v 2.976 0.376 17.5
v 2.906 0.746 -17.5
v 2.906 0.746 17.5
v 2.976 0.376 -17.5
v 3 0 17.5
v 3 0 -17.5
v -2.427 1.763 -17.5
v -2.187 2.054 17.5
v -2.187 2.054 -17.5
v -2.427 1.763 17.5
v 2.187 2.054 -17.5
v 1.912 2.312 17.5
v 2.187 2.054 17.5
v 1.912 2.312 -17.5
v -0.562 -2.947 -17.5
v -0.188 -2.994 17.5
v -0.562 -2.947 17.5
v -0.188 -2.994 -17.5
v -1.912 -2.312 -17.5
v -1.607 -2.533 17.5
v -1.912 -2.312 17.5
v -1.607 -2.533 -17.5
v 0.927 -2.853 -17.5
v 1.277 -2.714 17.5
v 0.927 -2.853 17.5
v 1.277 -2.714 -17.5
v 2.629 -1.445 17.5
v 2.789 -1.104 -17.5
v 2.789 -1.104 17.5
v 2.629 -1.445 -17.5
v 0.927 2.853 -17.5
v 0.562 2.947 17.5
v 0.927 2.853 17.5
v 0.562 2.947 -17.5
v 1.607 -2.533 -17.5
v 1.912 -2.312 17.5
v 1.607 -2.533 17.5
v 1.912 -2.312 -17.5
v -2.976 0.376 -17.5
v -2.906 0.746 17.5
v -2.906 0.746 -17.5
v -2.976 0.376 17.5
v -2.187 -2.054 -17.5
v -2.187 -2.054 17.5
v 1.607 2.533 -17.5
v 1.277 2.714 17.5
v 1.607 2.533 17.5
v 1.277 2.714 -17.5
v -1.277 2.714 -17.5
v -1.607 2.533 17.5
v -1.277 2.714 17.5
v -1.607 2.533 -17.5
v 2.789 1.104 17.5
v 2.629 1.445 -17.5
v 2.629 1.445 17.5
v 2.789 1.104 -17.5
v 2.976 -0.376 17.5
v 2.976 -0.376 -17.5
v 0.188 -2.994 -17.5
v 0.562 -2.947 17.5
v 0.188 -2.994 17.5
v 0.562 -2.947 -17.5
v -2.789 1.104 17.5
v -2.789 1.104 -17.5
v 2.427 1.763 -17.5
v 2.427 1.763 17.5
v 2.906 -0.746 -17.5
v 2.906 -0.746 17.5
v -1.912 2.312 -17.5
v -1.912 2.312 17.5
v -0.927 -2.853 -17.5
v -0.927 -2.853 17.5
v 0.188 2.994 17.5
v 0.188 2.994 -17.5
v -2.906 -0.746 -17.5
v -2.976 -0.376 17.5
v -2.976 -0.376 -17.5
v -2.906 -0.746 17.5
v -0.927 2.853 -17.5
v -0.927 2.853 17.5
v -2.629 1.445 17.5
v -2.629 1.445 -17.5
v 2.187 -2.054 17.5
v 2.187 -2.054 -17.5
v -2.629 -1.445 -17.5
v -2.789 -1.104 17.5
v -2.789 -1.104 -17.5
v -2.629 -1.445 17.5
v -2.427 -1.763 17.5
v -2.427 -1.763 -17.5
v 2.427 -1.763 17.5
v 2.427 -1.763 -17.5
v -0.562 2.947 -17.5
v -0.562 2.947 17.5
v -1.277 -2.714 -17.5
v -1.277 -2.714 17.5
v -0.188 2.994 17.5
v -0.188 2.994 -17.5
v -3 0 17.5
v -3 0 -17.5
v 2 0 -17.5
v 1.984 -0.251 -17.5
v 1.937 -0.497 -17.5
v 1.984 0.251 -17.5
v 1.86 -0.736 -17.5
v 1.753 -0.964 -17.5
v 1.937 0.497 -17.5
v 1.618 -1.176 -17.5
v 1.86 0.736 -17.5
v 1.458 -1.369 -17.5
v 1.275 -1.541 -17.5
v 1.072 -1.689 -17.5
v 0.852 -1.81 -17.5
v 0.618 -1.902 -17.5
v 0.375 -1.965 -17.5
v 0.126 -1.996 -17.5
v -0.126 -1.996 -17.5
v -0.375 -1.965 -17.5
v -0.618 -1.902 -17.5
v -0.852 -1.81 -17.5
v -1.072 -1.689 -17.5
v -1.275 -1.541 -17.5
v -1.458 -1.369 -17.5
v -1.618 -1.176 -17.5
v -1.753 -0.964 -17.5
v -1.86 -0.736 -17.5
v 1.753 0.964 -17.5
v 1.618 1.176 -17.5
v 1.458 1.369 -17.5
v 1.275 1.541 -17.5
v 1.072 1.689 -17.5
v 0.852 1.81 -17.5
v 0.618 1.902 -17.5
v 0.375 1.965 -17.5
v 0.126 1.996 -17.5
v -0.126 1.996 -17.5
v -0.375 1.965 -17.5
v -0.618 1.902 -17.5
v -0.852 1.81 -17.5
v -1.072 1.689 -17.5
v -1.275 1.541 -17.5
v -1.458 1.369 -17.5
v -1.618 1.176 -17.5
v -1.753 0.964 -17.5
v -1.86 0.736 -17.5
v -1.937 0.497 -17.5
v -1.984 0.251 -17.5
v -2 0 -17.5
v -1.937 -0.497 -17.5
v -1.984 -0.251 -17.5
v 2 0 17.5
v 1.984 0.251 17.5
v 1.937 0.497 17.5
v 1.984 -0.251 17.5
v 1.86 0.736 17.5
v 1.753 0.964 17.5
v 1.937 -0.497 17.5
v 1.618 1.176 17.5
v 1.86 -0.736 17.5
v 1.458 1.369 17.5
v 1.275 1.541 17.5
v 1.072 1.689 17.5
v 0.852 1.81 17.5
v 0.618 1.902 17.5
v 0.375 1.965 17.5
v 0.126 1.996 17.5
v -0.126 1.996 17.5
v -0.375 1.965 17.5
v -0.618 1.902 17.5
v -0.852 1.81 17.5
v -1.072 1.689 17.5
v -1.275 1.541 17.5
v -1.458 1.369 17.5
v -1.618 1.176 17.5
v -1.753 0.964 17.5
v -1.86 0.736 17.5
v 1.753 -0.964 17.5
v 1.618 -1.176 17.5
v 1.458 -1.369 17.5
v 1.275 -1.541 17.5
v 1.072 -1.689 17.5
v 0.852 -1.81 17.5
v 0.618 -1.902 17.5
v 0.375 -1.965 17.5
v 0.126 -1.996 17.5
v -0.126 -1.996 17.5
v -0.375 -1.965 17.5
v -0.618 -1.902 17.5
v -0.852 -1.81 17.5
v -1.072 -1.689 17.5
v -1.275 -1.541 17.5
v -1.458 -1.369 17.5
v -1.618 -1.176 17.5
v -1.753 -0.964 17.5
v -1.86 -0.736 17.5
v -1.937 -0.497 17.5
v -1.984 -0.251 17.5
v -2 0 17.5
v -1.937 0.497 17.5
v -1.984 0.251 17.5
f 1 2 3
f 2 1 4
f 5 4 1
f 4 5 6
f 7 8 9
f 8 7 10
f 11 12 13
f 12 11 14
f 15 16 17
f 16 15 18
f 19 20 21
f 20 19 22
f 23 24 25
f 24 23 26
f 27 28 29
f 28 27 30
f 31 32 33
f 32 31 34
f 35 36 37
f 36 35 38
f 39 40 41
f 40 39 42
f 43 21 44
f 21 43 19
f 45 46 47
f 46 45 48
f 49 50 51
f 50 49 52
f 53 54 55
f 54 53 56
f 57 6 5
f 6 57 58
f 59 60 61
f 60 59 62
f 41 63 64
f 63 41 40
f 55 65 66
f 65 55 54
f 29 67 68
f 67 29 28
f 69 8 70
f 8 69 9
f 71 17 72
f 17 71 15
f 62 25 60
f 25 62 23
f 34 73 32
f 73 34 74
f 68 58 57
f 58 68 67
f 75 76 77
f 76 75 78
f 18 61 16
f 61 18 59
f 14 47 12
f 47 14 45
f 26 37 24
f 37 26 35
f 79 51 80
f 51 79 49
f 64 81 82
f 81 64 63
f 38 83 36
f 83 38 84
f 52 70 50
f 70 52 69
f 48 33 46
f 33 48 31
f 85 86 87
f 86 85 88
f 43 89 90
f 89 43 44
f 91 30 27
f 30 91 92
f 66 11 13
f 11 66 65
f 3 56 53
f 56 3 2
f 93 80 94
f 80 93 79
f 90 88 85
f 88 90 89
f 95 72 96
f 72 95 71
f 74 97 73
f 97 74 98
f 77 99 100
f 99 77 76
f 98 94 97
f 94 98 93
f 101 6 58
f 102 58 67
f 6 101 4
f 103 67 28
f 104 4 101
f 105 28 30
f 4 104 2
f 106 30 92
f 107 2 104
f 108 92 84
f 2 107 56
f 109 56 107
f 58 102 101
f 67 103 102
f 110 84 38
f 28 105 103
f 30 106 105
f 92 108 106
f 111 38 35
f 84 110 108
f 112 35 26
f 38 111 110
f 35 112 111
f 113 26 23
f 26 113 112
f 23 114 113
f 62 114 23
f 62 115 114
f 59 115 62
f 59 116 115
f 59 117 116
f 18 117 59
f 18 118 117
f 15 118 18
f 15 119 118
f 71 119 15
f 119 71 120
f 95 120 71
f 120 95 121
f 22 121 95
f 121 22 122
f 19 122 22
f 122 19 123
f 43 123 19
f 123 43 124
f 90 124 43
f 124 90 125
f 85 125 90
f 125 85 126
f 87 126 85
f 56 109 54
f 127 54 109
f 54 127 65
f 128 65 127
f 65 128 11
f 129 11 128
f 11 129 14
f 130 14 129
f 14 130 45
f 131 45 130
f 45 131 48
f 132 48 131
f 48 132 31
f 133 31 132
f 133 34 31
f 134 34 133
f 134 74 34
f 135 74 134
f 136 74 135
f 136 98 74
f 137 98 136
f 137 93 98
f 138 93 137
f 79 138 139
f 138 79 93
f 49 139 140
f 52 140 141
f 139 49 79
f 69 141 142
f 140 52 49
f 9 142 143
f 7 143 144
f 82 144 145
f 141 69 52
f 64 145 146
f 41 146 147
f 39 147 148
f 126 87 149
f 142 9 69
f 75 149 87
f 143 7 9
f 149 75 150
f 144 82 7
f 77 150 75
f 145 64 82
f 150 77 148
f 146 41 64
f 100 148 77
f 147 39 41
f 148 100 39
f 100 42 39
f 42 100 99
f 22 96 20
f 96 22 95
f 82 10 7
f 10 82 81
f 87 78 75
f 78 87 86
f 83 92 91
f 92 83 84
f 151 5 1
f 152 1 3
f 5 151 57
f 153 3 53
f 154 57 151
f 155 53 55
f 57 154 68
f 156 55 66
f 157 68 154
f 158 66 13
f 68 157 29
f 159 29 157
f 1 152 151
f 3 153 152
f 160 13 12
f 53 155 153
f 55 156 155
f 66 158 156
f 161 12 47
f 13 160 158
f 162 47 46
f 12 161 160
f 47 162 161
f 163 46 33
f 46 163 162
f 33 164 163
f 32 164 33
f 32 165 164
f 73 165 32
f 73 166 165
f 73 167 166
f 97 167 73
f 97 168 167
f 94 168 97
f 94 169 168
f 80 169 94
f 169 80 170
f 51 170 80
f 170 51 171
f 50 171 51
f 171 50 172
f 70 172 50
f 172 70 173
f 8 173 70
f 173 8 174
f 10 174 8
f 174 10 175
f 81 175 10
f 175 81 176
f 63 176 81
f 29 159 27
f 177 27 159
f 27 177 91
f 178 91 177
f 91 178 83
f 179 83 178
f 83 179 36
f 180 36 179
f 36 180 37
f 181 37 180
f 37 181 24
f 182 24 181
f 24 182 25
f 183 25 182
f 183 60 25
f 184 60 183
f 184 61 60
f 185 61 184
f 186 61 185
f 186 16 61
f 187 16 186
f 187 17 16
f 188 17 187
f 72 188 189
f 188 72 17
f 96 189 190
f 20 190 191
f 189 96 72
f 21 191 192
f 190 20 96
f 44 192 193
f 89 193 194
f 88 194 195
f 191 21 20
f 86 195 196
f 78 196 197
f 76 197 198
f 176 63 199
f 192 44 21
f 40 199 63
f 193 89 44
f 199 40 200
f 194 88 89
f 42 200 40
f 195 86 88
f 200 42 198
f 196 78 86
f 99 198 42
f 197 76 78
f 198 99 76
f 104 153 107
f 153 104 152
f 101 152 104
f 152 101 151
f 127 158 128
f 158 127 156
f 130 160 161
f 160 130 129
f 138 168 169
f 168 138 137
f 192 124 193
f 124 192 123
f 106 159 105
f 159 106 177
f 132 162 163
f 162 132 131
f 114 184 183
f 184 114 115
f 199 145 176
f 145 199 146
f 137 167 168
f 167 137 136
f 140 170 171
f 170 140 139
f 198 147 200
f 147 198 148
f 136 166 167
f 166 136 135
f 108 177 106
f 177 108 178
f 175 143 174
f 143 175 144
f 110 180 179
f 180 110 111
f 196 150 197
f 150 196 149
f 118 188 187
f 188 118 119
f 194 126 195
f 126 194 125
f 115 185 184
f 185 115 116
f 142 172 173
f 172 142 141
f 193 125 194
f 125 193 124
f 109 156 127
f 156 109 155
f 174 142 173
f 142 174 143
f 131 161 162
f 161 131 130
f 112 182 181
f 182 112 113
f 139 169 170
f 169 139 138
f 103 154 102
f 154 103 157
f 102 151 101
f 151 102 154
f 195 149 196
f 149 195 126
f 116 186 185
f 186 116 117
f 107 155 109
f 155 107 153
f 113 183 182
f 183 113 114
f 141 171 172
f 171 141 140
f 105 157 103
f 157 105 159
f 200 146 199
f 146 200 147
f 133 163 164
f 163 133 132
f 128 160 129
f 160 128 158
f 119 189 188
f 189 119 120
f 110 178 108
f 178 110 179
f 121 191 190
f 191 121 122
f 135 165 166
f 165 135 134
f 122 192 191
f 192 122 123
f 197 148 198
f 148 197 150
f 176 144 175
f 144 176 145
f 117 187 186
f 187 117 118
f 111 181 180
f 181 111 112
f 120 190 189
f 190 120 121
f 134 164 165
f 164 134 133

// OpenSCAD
$fn = 50;


difference() {
	union() {
		translate(v = [0, 0, -17.5000000000]) {
			cylinder(h = 35, r = 3.0000000000);
		}
	}
	union() {
		translate(v = [0, 0, -100.0000000000]) {
			cylinder(h = 200, r = 2.0000000000);
		}
	}
}
